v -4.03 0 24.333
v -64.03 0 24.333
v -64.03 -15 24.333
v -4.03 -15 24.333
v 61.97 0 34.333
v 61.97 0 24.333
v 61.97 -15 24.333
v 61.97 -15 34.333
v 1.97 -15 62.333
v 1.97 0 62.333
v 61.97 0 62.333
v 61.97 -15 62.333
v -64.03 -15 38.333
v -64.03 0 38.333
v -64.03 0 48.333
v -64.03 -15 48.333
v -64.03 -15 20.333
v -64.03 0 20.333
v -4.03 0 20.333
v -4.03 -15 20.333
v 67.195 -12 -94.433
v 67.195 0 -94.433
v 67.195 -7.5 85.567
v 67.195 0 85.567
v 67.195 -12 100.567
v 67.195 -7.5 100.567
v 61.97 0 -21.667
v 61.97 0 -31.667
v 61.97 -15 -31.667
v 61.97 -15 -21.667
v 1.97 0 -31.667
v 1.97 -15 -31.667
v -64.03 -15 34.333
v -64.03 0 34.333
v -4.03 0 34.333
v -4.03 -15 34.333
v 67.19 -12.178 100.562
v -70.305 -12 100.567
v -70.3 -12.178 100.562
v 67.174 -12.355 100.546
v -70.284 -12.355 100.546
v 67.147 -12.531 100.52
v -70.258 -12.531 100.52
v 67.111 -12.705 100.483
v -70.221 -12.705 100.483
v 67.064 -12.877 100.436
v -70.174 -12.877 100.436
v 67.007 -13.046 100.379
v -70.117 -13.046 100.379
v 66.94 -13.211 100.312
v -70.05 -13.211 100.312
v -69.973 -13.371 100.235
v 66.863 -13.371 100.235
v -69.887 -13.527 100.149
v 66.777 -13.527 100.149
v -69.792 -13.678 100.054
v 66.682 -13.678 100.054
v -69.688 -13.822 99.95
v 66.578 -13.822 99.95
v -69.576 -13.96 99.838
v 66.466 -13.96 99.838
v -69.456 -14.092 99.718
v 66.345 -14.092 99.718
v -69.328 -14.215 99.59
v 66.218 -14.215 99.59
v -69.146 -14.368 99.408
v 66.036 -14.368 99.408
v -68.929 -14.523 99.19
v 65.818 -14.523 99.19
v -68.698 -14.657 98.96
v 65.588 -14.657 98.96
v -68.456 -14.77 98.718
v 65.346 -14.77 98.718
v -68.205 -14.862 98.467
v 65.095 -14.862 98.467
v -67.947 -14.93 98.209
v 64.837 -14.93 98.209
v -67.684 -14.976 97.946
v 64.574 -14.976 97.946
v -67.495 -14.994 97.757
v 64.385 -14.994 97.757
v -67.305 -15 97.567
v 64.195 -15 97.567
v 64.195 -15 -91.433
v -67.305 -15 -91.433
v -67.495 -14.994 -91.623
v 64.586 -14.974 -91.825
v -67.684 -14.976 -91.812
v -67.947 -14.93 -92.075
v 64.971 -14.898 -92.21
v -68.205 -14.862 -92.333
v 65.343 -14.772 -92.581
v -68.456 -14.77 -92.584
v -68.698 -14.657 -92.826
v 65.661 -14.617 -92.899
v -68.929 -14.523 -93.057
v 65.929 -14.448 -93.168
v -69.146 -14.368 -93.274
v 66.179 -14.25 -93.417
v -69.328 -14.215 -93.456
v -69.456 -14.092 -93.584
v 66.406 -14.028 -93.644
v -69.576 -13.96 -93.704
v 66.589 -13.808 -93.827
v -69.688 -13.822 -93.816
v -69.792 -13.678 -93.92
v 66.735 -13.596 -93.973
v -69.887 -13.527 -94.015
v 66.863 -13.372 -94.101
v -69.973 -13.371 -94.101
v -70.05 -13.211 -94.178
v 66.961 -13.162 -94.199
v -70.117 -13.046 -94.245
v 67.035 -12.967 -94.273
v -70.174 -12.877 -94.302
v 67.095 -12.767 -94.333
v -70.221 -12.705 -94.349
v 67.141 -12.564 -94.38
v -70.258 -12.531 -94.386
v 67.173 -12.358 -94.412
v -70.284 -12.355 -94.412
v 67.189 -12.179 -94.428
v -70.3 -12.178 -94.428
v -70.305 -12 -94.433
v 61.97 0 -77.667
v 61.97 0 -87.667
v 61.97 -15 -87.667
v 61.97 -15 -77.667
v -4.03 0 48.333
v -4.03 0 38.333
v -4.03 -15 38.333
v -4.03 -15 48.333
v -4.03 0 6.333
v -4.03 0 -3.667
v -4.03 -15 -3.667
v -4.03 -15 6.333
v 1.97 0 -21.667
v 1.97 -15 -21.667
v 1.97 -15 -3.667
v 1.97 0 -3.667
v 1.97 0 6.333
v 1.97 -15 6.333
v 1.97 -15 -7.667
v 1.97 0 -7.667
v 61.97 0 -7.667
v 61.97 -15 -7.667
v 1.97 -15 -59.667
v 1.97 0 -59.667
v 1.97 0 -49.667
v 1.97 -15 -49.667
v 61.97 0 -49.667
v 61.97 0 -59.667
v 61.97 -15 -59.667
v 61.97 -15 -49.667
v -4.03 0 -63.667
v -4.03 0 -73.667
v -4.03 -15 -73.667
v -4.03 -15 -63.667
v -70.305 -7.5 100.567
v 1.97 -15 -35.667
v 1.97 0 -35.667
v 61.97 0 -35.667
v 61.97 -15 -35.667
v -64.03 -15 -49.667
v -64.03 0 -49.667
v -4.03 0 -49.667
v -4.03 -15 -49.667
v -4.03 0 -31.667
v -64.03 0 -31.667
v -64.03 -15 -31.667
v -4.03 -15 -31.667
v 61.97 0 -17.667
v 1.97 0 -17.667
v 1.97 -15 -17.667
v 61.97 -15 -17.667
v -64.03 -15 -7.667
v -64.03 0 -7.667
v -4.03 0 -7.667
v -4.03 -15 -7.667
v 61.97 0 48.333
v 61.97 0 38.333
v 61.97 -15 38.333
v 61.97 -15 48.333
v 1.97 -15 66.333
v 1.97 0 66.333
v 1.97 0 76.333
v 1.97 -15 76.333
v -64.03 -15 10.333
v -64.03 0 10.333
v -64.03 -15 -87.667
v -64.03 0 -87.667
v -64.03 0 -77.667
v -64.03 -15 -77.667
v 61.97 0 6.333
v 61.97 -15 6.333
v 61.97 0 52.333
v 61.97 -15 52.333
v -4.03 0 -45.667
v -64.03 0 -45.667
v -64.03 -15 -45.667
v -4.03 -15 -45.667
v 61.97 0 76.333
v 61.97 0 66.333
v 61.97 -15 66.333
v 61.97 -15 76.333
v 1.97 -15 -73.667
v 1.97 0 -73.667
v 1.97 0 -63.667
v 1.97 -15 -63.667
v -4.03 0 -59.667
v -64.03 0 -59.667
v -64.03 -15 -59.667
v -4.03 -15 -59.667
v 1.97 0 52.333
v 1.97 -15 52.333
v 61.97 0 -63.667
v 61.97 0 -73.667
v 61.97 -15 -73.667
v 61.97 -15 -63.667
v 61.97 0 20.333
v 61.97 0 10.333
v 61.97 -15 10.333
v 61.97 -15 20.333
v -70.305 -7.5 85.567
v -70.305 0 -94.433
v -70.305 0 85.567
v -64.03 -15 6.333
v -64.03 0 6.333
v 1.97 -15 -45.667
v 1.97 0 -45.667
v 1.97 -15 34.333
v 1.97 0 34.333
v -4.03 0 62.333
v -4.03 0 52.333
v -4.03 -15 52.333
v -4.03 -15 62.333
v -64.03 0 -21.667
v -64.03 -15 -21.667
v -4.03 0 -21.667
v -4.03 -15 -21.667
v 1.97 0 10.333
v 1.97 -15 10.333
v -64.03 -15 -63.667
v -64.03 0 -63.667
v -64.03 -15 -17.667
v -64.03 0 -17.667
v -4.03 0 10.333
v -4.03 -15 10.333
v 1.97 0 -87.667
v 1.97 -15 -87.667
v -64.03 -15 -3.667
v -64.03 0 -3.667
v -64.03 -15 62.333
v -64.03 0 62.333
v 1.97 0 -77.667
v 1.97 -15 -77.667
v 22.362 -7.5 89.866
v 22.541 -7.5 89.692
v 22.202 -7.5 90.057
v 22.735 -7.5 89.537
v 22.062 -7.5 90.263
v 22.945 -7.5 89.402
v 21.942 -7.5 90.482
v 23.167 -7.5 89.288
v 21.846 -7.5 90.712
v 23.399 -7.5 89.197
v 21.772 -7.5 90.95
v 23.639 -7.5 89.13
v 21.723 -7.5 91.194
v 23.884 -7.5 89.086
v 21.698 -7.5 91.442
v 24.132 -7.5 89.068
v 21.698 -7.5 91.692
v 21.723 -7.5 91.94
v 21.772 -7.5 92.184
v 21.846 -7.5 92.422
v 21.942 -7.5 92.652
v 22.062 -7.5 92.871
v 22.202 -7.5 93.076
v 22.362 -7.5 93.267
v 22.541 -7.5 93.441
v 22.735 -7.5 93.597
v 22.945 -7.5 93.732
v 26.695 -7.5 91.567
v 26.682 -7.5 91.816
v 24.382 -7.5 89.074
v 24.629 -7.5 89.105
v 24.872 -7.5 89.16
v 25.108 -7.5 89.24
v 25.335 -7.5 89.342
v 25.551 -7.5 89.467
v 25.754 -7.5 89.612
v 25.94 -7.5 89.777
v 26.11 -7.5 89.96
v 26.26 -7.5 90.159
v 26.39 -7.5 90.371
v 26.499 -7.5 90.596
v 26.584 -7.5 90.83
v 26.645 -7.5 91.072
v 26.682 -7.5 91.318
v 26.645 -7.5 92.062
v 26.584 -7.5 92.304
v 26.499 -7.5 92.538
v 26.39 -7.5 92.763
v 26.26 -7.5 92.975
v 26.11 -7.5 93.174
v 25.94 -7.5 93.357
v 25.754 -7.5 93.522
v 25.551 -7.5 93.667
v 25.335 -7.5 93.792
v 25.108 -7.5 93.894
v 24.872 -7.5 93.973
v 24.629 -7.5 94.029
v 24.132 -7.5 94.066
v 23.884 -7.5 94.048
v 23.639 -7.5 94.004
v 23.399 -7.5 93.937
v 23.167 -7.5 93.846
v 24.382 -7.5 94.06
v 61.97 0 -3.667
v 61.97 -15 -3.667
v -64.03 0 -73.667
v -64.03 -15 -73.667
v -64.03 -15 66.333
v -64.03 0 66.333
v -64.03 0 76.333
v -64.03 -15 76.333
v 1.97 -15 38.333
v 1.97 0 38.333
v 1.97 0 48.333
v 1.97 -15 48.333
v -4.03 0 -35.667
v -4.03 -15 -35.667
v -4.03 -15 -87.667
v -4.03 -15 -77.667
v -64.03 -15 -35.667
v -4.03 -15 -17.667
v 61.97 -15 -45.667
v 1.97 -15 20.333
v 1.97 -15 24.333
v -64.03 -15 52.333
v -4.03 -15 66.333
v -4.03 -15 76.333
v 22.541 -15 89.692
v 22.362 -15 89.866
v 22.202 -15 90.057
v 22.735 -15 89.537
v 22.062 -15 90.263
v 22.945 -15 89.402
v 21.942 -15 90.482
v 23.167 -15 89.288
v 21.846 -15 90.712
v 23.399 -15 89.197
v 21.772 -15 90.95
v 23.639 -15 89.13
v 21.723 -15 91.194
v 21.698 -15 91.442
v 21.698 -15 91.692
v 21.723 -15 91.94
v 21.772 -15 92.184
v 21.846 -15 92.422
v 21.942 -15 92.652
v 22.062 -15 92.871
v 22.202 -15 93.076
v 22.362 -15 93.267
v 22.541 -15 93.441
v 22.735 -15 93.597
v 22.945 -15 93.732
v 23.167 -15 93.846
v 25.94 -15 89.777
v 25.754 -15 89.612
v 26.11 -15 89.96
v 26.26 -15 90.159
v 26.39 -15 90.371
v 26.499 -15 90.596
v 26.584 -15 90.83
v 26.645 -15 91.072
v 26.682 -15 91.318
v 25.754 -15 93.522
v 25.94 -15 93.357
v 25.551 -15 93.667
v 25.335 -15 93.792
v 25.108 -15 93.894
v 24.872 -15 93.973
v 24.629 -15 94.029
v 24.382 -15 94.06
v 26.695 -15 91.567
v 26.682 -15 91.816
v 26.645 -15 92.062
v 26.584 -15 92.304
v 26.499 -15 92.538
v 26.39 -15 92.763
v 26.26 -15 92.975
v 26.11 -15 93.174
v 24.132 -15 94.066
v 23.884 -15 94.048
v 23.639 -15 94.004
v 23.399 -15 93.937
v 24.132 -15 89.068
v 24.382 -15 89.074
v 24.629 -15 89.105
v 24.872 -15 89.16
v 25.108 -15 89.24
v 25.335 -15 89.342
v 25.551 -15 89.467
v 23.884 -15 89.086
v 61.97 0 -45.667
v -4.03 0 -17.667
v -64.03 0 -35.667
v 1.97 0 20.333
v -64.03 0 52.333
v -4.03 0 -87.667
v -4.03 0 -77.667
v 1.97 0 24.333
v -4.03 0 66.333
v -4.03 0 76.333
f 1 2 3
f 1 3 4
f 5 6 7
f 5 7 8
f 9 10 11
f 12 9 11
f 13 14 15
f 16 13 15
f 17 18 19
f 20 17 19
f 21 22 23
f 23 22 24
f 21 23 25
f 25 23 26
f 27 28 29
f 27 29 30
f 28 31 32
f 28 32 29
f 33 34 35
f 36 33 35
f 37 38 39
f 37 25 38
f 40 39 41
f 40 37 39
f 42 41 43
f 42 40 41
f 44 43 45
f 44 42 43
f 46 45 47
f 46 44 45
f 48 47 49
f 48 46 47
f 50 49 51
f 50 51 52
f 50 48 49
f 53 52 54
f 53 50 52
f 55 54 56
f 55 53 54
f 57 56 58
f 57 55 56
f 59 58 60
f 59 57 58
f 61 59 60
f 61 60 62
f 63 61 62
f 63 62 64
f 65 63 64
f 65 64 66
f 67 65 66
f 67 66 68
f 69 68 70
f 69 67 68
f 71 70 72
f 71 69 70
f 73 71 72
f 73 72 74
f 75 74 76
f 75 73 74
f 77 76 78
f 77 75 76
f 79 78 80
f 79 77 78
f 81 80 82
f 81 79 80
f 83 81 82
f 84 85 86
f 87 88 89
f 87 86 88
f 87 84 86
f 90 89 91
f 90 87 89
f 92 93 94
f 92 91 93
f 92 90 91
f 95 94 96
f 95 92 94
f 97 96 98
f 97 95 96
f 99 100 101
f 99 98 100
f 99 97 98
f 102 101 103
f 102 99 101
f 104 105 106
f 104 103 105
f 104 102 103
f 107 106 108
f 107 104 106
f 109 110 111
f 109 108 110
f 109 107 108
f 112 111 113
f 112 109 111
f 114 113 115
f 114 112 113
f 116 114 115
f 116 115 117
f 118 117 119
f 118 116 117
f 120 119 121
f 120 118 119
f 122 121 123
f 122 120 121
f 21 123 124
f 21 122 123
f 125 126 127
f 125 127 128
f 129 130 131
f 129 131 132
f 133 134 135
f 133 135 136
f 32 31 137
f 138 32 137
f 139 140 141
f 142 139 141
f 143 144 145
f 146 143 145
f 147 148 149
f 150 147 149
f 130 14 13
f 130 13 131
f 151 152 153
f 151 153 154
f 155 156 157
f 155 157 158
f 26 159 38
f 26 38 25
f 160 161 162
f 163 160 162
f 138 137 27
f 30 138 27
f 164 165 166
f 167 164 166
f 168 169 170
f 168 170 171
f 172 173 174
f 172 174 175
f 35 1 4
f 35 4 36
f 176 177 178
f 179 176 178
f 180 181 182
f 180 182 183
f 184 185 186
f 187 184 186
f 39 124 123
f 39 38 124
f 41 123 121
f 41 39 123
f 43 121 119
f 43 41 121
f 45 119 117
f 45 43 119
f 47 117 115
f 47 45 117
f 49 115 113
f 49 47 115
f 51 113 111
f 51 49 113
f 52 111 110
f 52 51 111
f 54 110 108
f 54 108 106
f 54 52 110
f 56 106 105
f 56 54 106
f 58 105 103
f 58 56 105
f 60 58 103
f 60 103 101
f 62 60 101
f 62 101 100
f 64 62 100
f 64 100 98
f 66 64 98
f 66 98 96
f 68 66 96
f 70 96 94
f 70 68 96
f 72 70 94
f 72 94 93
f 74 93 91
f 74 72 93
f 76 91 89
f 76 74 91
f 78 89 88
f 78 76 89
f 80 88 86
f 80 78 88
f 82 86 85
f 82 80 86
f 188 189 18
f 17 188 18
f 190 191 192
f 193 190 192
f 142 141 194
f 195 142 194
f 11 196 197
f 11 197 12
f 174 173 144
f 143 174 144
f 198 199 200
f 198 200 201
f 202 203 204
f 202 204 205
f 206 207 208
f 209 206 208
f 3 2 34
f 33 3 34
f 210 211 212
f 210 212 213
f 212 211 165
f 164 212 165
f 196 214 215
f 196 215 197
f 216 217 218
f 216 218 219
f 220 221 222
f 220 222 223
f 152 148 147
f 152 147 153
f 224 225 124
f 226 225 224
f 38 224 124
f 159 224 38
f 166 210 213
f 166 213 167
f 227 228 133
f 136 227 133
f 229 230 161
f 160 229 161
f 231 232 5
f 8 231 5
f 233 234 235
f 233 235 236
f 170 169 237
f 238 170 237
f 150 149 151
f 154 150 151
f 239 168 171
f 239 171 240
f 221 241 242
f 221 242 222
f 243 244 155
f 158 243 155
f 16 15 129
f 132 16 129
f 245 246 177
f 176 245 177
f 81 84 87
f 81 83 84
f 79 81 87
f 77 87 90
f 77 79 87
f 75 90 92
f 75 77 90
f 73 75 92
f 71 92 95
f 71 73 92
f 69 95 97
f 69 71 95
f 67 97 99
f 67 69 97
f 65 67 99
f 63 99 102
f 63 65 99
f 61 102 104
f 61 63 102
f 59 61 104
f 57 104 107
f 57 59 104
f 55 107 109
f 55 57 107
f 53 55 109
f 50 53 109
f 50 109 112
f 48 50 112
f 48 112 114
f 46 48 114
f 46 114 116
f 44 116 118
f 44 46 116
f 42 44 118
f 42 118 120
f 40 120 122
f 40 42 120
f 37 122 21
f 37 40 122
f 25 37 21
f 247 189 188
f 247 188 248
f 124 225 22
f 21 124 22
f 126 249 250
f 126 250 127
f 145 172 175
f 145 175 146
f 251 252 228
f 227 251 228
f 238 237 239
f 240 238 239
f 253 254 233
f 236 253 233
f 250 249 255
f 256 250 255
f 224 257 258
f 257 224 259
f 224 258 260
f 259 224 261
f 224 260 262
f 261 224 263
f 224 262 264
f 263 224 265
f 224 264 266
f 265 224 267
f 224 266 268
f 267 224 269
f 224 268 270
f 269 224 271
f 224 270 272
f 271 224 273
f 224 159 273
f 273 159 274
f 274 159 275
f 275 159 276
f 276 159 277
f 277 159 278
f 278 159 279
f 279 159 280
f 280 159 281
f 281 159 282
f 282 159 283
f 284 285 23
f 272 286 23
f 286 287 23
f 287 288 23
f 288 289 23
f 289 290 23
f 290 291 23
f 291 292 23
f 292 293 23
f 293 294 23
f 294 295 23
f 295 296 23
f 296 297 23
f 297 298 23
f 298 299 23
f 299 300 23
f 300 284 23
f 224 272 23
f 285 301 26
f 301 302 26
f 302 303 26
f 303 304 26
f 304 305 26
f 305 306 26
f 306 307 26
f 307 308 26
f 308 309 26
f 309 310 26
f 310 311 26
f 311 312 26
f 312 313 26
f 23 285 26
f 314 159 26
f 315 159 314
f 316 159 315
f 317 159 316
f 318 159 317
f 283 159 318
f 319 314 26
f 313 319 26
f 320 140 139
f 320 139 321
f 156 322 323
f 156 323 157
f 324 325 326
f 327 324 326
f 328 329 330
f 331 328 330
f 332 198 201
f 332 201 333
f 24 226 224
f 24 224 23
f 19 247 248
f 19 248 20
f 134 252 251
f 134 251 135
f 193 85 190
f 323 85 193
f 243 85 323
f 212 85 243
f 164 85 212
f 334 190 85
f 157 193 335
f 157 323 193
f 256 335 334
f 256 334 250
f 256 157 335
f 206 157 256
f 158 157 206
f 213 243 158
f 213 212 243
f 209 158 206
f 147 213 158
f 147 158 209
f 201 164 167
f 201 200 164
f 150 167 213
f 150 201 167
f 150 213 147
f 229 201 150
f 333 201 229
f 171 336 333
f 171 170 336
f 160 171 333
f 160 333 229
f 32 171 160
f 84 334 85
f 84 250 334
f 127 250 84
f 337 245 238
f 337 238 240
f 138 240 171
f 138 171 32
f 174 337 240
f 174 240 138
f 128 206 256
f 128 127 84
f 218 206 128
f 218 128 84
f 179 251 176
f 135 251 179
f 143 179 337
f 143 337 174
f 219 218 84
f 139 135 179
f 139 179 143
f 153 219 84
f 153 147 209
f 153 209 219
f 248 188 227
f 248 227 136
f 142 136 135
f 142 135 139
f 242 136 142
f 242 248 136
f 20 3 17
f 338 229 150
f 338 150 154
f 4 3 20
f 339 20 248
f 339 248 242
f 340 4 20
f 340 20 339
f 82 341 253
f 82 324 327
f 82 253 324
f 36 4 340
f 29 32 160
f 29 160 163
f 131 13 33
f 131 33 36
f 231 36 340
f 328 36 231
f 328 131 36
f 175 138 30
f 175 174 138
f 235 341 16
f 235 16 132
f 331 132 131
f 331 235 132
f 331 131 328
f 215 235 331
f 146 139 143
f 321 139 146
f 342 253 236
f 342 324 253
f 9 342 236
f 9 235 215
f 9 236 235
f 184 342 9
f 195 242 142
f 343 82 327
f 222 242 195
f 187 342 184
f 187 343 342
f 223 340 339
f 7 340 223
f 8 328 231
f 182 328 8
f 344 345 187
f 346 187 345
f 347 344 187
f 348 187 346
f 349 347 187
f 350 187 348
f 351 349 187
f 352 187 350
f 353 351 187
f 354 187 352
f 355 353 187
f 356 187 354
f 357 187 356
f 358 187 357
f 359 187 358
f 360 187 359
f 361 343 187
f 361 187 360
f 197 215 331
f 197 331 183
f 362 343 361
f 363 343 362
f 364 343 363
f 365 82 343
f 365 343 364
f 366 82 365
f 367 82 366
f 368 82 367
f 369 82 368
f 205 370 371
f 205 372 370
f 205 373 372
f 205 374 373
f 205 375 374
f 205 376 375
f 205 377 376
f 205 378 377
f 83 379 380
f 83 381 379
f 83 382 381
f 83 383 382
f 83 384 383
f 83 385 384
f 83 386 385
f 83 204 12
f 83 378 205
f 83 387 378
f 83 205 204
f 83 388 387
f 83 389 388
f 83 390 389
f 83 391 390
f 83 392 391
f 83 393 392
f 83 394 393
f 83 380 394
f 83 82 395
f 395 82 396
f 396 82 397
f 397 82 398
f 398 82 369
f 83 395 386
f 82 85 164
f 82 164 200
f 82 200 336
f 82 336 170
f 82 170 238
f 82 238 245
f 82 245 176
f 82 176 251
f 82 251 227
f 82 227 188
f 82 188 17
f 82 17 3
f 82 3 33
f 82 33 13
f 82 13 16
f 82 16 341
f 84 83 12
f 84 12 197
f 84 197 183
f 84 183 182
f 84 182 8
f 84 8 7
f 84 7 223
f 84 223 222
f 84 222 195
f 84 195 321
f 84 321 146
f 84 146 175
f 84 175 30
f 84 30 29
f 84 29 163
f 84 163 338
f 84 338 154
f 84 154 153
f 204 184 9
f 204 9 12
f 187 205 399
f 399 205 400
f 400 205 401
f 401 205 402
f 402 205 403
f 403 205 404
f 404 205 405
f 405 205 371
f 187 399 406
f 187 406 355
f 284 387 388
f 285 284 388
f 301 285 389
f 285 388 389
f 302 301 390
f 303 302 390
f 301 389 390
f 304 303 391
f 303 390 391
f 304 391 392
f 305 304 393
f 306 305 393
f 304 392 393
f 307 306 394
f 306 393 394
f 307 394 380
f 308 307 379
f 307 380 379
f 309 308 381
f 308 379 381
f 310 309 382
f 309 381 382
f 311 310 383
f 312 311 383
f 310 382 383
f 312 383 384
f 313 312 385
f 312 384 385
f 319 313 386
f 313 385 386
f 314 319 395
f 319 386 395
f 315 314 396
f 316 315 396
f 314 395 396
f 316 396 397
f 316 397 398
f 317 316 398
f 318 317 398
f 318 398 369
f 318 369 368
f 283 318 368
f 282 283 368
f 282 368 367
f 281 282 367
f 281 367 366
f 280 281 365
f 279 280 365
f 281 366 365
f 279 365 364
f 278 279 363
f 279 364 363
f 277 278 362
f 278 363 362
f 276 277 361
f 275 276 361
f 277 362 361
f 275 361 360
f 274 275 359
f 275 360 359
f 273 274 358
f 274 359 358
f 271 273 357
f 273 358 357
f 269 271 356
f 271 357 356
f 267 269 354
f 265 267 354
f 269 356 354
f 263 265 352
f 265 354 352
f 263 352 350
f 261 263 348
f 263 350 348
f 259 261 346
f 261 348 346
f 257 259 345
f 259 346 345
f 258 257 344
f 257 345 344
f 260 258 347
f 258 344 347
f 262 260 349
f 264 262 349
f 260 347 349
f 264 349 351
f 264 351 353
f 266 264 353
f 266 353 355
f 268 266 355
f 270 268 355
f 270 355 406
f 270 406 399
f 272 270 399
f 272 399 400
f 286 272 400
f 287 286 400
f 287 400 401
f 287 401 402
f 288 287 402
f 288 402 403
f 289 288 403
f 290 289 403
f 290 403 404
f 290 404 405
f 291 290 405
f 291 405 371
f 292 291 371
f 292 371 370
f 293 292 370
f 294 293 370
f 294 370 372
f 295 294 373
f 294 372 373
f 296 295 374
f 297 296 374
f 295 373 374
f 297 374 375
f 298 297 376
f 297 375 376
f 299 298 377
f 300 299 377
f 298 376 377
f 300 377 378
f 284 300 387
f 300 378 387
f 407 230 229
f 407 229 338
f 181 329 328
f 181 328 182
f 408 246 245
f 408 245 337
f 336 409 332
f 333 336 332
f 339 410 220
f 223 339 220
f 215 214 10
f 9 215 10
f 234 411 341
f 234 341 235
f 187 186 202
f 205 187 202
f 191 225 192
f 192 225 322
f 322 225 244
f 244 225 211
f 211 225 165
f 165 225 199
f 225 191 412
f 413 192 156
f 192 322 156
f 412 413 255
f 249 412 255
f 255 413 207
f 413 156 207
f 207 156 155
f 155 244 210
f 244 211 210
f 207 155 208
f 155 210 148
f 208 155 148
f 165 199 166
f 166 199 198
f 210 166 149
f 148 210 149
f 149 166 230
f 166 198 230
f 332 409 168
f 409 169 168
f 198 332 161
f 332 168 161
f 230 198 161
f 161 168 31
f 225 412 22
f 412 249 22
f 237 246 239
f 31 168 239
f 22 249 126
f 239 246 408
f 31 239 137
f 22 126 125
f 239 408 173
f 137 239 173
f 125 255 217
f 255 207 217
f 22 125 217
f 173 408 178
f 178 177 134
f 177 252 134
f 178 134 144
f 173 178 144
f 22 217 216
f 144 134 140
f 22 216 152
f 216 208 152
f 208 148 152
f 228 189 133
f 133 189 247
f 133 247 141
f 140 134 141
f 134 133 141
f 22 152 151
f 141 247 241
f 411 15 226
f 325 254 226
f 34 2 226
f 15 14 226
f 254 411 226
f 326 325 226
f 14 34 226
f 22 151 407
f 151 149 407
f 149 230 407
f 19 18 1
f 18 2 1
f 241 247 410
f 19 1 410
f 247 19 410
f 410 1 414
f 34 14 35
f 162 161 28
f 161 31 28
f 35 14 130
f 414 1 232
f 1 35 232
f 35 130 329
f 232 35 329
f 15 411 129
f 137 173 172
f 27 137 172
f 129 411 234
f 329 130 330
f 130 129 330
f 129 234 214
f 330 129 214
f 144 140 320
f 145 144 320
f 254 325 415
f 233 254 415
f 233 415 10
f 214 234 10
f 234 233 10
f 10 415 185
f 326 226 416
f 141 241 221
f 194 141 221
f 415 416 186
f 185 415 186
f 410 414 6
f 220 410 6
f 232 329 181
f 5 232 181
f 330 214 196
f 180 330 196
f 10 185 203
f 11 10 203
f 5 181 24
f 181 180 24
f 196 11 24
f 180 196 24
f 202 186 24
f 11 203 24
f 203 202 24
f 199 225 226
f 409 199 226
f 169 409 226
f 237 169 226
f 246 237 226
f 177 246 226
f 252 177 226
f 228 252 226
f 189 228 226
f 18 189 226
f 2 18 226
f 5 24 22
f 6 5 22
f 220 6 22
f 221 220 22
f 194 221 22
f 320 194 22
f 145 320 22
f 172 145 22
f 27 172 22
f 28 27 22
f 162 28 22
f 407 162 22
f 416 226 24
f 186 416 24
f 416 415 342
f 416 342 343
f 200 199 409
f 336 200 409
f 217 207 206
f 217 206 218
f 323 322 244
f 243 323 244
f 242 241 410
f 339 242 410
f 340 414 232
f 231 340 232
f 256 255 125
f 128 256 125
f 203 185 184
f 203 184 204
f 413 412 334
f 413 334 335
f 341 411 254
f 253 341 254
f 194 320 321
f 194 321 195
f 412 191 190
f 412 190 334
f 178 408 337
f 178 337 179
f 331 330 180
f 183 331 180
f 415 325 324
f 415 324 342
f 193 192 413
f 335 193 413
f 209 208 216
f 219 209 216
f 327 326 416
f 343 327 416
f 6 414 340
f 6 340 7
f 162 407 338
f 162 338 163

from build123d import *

# Parameters (mm, degrees)
F0_W     = 137.5
F0_H     = 195
F0_W_2   = 60
F0_H_2   = 10
F1_DEPTH = 15
F2_W     = 137.5
F2_H     = 15
F3_DEPTH = 7.5
F4_R     = 2.5
F5_DEPTH = 7.5
F6_R     = 3


with BuildPart() as f1:
    # F0 (on Front) → F1 (new body)
    with BuildSketch(Plane.XZ):
        with Locations((-1.555176, 3.066924)):
            Rectangle(F0_W, F0_H)
        with Locations((-34.030074, -82.667378)):
            Rectangle(F0_W_2, F0_H_2, mode=Mode.SUBTRACT)
        with Locations((-34.030074, -68.667378)):
            Rectangle(F0_W_2, F0_H_2, mode=Mode.SUBTRACT)
        with Locations((-34.030074, -54.667378)):
            Rectangle(F0_W_2, F0_H_2, mode=Mode.SUBTRACT)
        with Locations((-34.030074, -40.667378)):
            Rectangle(F0_W_2, F0_H_2, mode=Mode.SUBTRACT)
        with Locations((-34.030074, -26.667378)):
            Rectangle(F0_W_2, F0_H_2, mode=Mode.SUBTRACT)
        with Locations((-34.030074, -12.667378)):
            Rectangle(F0_W_2, F0_H_2, mode=Mode.SUBTRACT)
        with Locations((-34.030074, 1.332622)):
            Rectangle(F0_W_2, F0_H_2, mode=Mode.SUBTRACT)
        with Locations((31.969926, -82.667378)):
            Rectangle(F0_W_2, F0_H_2, mode=Mode.SUBTRACT)
        with Locations((31.969926, -68.667378)):
            Rectangle(F0_W_2, F0_H_2, mode=Mode.SUBTRACT)
        with Locations((31.969926, -54.667378)):
            Rectangle(F0_W_2, F0_H_2, mode=Mode.SUBTRACT)
        with Locations((31.969926, -40.667378)):
            Rectangle(F0_W_2, F0_H_2, mode=Mode.SUBTRACT)
        with Locations((31.969926, -26.667378)):
            Rectangle(F0_W_2, F0_H_2, mode=Mode.SUBTRACT)
        with Locations((31.969926, -12.667378)):
            Rectangle(F0_W_2, F0_H_2, mode=Mode.SUBTRACT)
        with Locations((31.969926, 1.332622)):
            Rectangle(F0_W_2, F0_H_2, mode=Mode.SUBTRACT)
        with Locations((-34.030074, 15.332622)):
            Rectangle(F0_W_2, F0_H_2, mode=Mode.SUBTRACT)
        with Locations((-34.030074, 29.332622)):
            Rectangle(F0_W_2, F0_H_2, mode=Mode.SUBTRACT)
        with Locations((-34.030074, 43.332622)):
            Rectangle(F0_W_2, F0_H_2, mode=Mode.SUBTRACT)
        with Locations((-34.030074, 57.332622)):
            Rectangle(F0_W_2, F0_H_2, mode=Mode.SUBTRACT)
        with Locations((-34.030074, 71.332622)):
            Rectangle(F0_W_2, F0_H_2, mode=Mode.SUBTRACT)
        with Locations((31.969926, 15.332622)):
            Rectangle(F0_W_2, F0_H_2, mode=Mode.SUBTRACT)
        with Locations((31.969926, 29.332622)):
            Rectangle(F0_W_2, F0_H_2, mode=Mode.SUBTRACT)
        with Locations((31.969926, 43.332622)):
            Rectangle(F0_W_2, F0_H_2, mode=Mode.SUBTRACT)
        with Locations((31.969926, 57.332622)):
            Rectangle(F0_W_2, F0_H_2, mode=Mode.SUBTRACT)
        with Locations((31.969926, 71.332622)):
            Rectangle(F0_W_2, F0_H_2, mode=Mode.SUBTRACT)
    extrude(amount=F1_DEPTH)

    # F2 (on Front) → F3 (cut)
    with BuildSketch(Plane.XZ):
        with Locations((-1.555176, 93.066924)):
            Rectangle(F2_W, F2_H)
    extrude(amount=F3_DEPTH, mode=Mode.SUBTRACT)

    # F4 (on face) → F5 (cut, through all)
    with BuildSketch(Plane.XZ.offset(15)):
        with Locations((24.194824, 91.566924)):
            Circle(F4_R)
    extrude(amount=-F5_DEPTH, mode=Mode.SUBTRACT)

    # F6
    f6_edges = [f1.edges().sort_by_distance(p)[0] for p in [
        (-1.555176, -15, 100.566924),
        (-70.305176, -15, 3.066924),
        (67.194824, -15, 3.066924),
        (-1.555176, -15, -94.433076),
    ]]
    fillet(f6_edges, radius=F6_R)


solid = f1.part
